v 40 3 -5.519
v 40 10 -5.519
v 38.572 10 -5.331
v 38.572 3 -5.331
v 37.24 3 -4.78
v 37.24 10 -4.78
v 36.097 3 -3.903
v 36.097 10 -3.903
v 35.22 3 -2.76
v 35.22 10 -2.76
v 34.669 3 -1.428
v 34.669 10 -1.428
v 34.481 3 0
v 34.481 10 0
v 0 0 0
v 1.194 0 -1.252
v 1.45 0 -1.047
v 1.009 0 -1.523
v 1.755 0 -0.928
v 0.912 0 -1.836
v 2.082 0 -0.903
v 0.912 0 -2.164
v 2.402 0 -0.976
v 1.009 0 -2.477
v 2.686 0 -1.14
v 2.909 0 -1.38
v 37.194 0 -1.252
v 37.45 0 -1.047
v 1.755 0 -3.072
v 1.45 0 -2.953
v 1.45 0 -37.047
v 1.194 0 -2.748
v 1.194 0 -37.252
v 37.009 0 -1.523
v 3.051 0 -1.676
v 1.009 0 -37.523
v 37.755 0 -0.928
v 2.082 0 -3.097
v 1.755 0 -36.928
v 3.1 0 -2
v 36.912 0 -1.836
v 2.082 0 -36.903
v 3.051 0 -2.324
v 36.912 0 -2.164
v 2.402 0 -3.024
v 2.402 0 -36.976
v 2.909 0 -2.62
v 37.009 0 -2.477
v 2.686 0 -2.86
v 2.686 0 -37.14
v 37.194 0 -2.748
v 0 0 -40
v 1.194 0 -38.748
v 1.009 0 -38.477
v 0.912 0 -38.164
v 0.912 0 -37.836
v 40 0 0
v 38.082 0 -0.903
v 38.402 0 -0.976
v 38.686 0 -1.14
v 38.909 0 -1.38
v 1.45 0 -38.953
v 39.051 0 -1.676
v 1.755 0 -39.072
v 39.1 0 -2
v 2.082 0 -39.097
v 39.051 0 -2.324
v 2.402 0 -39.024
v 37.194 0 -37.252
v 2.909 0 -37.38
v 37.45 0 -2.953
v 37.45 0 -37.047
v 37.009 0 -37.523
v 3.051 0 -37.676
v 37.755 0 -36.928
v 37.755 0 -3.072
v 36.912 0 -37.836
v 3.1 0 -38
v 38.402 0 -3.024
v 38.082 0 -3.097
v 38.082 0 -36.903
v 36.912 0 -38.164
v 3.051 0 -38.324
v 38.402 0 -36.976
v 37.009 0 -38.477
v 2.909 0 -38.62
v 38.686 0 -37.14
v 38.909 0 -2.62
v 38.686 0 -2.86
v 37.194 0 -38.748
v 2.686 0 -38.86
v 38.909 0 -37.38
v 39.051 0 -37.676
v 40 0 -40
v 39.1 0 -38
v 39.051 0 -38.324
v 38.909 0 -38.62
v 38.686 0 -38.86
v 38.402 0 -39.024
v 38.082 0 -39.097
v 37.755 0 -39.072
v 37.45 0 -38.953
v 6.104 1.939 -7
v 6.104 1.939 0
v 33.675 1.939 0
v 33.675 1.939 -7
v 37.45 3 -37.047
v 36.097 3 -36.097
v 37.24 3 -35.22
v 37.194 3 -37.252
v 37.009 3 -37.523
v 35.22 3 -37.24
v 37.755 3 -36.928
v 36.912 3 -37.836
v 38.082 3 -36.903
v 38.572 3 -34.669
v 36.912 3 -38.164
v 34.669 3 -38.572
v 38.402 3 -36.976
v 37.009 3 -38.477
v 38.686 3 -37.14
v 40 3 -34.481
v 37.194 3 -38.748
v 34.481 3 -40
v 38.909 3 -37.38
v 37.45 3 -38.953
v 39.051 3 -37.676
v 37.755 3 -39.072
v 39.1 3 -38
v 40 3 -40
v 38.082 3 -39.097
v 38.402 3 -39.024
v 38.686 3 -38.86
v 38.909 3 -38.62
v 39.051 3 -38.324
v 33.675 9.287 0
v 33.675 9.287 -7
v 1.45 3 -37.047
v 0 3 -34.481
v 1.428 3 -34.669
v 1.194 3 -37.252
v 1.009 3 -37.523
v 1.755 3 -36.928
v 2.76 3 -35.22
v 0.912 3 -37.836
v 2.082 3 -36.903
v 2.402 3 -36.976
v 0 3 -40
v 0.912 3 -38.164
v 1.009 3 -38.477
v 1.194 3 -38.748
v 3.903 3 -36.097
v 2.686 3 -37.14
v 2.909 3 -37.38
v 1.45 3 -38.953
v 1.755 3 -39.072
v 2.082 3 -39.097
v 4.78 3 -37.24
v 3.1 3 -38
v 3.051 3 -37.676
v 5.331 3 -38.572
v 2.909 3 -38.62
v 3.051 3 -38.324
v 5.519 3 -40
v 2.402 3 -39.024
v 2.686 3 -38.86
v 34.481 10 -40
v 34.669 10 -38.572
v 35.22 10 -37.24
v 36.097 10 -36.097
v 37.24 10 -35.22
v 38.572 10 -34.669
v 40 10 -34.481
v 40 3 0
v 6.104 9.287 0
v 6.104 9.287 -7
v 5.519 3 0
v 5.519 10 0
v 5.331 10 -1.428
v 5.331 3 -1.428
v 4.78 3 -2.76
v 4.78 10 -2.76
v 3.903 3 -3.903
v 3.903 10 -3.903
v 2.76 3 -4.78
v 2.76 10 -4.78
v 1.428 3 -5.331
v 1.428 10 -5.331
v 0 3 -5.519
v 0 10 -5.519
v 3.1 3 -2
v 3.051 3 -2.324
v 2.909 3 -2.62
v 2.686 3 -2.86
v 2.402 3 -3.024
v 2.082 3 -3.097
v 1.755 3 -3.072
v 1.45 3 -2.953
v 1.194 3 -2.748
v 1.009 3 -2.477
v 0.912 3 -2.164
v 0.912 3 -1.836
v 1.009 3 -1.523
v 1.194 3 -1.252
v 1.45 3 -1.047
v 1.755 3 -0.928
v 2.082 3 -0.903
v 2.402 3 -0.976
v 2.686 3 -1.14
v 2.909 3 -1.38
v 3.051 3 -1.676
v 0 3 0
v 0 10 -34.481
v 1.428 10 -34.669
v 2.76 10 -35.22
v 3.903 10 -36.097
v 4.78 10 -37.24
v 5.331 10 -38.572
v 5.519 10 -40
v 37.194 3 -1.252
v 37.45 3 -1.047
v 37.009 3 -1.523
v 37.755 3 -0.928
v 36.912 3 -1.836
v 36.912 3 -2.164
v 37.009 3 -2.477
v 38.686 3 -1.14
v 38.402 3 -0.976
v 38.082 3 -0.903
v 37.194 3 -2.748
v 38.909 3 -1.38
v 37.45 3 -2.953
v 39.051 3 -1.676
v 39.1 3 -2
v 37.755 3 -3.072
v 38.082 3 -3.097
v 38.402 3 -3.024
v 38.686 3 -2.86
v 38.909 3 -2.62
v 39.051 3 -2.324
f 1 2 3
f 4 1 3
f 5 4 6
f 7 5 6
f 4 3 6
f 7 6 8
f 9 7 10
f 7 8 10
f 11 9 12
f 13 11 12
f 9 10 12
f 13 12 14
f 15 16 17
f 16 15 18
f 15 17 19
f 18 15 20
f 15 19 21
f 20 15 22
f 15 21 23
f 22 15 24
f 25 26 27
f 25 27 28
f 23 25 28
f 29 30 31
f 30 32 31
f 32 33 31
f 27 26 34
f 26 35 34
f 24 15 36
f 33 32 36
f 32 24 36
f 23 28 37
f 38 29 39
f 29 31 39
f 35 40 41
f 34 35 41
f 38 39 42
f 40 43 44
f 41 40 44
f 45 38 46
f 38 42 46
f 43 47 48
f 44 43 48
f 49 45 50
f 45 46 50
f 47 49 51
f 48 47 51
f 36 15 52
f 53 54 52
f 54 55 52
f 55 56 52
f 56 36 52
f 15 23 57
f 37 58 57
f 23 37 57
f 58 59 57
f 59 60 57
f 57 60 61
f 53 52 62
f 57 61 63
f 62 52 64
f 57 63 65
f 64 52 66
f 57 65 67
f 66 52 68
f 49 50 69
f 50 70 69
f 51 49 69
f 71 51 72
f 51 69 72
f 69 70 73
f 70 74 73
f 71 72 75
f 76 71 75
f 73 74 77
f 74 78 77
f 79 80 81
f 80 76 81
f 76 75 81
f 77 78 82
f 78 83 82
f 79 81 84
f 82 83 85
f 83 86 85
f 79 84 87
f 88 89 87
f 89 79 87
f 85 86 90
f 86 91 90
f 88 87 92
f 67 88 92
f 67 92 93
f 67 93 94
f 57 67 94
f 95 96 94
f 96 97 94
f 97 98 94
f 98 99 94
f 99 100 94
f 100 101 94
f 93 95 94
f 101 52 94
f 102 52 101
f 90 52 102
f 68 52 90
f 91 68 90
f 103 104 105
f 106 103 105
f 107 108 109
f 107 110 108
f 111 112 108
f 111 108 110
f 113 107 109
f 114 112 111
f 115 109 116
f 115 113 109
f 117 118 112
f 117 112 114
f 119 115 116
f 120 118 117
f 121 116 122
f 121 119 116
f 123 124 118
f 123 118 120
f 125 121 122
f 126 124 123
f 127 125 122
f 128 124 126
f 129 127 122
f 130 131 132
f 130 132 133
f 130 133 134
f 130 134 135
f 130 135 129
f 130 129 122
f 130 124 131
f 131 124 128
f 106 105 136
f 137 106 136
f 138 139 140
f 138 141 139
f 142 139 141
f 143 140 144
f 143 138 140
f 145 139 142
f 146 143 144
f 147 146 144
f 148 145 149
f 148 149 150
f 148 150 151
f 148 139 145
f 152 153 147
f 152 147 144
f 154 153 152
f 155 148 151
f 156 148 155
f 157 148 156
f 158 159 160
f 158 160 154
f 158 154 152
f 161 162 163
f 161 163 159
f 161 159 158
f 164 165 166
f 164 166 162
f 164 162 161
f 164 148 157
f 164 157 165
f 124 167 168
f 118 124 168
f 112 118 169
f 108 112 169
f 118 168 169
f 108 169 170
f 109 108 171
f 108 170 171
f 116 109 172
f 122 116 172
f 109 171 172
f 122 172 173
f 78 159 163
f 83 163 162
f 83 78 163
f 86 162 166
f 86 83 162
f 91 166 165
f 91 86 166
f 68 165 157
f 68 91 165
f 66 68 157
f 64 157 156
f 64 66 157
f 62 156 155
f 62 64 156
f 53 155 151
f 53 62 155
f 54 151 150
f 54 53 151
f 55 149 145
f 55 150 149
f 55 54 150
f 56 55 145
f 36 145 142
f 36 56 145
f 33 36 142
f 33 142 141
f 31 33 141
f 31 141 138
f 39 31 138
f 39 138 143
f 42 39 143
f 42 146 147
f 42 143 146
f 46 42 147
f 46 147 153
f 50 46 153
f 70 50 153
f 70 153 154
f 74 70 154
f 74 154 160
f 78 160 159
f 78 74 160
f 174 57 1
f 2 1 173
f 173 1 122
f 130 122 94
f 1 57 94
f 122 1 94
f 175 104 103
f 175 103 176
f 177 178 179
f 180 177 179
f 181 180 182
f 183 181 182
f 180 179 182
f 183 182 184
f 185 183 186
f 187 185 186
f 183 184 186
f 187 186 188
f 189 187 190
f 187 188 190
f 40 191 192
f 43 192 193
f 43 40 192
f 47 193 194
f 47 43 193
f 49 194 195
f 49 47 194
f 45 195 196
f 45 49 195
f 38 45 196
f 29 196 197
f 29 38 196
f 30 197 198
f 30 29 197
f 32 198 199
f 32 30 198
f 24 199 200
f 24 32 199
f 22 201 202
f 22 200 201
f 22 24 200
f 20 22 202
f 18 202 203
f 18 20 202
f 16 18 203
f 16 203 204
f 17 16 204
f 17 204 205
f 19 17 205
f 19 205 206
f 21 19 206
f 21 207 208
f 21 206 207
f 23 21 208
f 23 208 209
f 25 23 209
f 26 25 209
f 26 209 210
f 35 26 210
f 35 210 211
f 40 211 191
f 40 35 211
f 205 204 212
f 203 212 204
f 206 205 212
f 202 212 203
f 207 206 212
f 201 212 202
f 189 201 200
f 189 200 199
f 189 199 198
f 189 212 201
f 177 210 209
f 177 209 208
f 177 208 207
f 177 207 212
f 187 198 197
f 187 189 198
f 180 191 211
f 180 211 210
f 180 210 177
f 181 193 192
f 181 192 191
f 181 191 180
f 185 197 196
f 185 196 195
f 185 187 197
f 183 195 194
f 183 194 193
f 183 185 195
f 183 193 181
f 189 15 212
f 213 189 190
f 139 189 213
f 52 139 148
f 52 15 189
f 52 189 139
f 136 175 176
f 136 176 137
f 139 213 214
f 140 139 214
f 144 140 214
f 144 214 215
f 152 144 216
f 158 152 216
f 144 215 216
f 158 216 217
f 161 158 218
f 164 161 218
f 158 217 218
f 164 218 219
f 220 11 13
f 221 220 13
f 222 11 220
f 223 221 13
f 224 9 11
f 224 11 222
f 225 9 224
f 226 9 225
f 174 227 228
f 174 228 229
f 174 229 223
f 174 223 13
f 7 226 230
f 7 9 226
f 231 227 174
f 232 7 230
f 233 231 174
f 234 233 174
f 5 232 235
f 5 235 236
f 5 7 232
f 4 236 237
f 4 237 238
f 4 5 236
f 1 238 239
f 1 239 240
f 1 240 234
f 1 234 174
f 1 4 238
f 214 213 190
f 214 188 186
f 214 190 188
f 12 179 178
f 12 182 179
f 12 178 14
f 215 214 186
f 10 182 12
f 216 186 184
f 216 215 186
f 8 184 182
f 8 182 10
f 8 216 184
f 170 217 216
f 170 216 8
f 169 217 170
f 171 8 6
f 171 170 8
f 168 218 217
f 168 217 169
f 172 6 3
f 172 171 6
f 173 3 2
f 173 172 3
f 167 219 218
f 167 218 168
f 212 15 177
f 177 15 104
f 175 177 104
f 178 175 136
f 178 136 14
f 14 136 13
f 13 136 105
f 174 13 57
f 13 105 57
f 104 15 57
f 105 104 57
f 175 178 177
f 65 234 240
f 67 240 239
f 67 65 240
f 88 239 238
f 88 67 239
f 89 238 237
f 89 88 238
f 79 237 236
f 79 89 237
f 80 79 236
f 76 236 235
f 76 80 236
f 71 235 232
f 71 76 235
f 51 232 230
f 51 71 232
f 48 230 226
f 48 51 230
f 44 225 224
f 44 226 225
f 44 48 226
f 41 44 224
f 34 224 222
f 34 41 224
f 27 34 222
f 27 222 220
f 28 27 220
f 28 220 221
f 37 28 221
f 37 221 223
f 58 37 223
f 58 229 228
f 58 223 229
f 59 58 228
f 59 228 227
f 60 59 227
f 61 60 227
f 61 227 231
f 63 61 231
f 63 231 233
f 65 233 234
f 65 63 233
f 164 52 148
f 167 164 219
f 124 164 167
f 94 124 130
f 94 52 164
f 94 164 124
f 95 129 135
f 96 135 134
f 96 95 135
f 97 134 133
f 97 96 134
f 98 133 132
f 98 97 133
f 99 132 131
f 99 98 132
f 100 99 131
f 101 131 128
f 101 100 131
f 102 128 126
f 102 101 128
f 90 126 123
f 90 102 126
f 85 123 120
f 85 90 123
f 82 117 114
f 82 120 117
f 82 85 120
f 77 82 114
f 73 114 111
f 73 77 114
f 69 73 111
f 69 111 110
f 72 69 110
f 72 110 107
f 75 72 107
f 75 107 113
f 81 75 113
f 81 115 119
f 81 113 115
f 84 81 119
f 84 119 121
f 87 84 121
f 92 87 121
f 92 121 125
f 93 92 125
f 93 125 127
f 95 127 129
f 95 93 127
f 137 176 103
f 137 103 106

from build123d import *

# Parameters (mm, degrees)
SKETCH1_W           = 40
SKETCH1_H           = 40
SKETCH1_R           = 1.1
BOSS_EXTRUDE1_DEPTH = 10
CUT_EXTRUDE1_DEPTH  = 7
SKETCH3_W           = 27.571173344
SKETCH3_H           = 7.347922722
CUT_EXTRUDE2_DEPTH  = 7


with BuildPart() as part:
    # Sketch1 → Boss-Extrude1 (new body)
    with BuildSketch(Plane(origin=(0, 0, 0), x_dir=(1, 0, 0), z_dir=(0, 1, 0))):
        with Locations((20, 20)):
            Rectangle(SKETCH1_W, SKETCH1_H)
        with Locations((2, 38)):
            Circle(SKETCH1_R, mode=Mode.SUBTRACT)
        with Locations((38, 38)):
            Circle(SKETCH1_R, mode=Mode.SUBTRACT)
        with Locations((2, 2)):
            Circle(SKETCH1_R, mode=Mode.SUBTRACT)
        with Locations((38, 2)):
            Circle(SKETCH1_R, mode=Mode.SUBTRACT)
    extrude(amount=BOSS_EXTRUDE1_DEPTH)

    # Sketch2 → Cut-Extrude1 (cut)
    with BuildSketch(Plane(origin=(0, 10, 0), x_dir=(1, 0, 0), z_dir=(0, 1, 0))):
        with BuildLine():
            Line((0, 0), (5.519280972, 0))
            ThreePointArc((5.519280972, 0), (3.902721002, 3.902721002), (0, 5.519280972))
            Line((0, 5.519280972), (0, 0))
        make_face()
        with BuildLine():
            Line((40, 0), (40, 5.519280972))
            ThreePointArc((40, 5.519280972), (36.097278998, 3.902721002), (34.480719028, 0))
            Line((34.480719028, 0), (40, 0))
        make_face()
        with BuildLine():
            Line((40, 40), (34.480719028, 40))
            ThreePointArc((34.480719028, 40), (36.097278998, 36.097278998), (40, 34.480719028))
            Line((40, 34.480719028), (40, 40))
        make_face()
        with BuildLine():
            Line((0, 40), (0, 34.480719028))
            ThreePointArc((0, 34.480719028), (3.902721002, 36.097278998), (5.519280972, 40))
            Line((5.519280972, 40), (0, 40))
        make_face()
    extrude(amount=-CUT_EXTRUDE1_DEPTH, mode=Mode.SUBTRACT)

    # Sketch3 → Cut-Extrude2 (cut)
    with BuildSketch(Plane.XY):
        with Locations((19.889703926, 5.612775806)):
            Rectangle(SKETCH3_W, SKETCH3_H)
    extrude(amount=-CUT_EXTRUDE2_DEPTH, mode=Mode.SUBTRACT)


solid = part.part
